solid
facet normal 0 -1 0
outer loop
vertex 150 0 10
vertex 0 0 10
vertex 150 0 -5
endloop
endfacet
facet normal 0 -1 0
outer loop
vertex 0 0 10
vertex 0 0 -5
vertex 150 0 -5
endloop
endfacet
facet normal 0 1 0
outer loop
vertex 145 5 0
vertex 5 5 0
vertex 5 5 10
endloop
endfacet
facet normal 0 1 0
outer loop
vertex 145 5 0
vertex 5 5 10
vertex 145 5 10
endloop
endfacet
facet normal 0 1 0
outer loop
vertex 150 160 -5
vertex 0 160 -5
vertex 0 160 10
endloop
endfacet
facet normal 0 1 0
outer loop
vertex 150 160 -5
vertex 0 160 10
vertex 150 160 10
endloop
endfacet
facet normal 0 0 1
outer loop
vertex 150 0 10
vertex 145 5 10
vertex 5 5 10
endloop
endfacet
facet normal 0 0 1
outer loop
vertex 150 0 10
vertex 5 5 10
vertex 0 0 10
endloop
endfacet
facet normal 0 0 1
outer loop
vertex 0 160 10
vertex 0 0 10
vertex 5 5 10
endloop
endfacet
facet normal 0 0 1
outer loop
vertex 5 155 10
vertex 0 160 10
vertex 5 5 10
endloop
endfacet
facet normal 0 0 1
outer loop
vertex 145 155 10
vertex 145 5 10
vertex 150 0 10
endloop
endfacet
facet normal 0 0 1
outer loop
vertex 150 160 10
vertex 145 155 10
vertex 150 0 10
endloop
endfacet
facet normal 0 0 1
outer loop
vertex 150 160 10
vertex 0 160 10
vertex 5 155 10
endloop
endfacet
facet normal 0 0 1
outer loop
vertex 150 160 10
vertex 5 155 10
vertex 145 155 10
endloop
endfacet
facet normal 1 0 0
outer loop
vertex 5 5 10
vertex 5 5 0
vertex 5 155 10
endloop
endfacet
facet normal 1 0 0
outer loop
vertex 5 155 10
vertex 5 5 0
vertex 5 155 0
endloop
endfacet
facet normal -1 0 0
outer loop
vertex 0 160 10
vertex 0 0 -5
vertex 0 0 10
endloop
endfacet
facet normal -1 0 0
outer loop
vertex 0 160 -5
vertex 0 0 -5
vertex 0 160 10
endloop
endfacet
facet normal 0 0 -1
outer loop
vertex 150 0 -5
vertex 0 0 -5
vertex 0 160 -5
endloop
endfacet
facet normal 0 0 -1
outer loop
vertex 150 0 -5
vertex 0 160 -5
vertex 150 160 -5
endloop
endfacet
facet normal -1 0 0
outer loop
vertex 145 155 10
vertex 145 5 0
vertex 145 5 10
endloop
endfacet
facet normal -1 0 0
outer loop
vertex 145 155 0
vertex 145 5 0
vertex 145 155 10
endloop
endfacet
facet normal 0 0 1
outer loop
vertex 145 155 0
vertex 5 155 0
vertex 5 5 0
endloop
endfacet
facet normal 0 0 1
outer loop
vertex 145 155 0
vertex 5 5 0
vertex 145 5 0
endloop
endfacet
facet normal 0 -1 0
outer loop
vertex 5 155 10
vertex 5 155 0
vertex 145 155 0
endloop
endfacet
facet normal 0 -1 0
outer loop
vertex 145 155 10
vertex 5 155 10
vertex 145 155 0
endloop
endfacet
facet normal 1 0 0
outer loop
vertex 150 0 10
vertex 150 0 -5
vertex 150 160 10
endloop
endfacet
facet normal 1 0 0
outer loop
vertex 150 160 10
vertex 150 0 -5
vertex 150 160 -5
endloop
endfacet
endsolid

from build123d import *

# Parameters (mm, degrees)
SKETCH1_W           = 150
SKETCH1_H           = 160
BOSS_EXTRUDE1_DEPTH = 5
SKETCH2_W           = 150
SKETCH2_H           = 5
BOSS_EXTRUDE2_DEPTH = 10
SKETCH3_W           = 5
SKETCH3_H           = 155
BOSS_EXTRUDE3_DEPTH = 10
SKETCH4_W           = 145
SKETCH4_H           = 5
BOSS_EXTRUDE4_DEPTH = 10
SKETCH5_W           = 5
SKETCH5_H           = 150
BOSS_EXTRUDE5_DEPTH = 10


with BuildPart() as part:
    # Sketch1 → Boss-Extrude1 (new body)
    with BuildSketch(Plane.XY):
        with Locations((75, 80)):
            Rectangle(SKETCH1_W, SKETCH1_H)
    extrude(amount=-BOSS_EXTRUDE1_DEPTH)

    # Sketch2 → Boss-Extrude2 (add)
    with BuildSketch(Plane.XY):
        with Locations((75, 157.5)):
            Rectangle(SKETCH2_W, SKETCH2_H)
    extrude(amount=BOSS_EXTRUDE2_DEPTH)

    # Sketch3 → Boss-Extrude3 (add)
    with BuildSketch(Plane.XY):
        with Locations((147.5, 77.5)):
            Rectangle(SKETCH3_W, SKETCH3_H)
    extrude(amount=BOSS_EXTRUDE3_DEPTH)

    # Sketch4 → Boss-Extrude4 (add)
    with BuildSketch(Plane.XY):
        with Locations((72.5, 2.5)):
            Rectangle(SKETCH4_W, SKETCH4_H)
    extrude(amount=BOSS_EXTRUDE4_DEPTH)

    # Sketch5 → Boss-Extrude5 (add)
    with BuildSketch(Plane.XY):
        with Locations((2.5, 80)):
            Rectangle(SKETCH5_W, SKETCH5_H)
    extrude(amount=BOSS_EXTRUDE5_DEPTH)


solid = part.part
